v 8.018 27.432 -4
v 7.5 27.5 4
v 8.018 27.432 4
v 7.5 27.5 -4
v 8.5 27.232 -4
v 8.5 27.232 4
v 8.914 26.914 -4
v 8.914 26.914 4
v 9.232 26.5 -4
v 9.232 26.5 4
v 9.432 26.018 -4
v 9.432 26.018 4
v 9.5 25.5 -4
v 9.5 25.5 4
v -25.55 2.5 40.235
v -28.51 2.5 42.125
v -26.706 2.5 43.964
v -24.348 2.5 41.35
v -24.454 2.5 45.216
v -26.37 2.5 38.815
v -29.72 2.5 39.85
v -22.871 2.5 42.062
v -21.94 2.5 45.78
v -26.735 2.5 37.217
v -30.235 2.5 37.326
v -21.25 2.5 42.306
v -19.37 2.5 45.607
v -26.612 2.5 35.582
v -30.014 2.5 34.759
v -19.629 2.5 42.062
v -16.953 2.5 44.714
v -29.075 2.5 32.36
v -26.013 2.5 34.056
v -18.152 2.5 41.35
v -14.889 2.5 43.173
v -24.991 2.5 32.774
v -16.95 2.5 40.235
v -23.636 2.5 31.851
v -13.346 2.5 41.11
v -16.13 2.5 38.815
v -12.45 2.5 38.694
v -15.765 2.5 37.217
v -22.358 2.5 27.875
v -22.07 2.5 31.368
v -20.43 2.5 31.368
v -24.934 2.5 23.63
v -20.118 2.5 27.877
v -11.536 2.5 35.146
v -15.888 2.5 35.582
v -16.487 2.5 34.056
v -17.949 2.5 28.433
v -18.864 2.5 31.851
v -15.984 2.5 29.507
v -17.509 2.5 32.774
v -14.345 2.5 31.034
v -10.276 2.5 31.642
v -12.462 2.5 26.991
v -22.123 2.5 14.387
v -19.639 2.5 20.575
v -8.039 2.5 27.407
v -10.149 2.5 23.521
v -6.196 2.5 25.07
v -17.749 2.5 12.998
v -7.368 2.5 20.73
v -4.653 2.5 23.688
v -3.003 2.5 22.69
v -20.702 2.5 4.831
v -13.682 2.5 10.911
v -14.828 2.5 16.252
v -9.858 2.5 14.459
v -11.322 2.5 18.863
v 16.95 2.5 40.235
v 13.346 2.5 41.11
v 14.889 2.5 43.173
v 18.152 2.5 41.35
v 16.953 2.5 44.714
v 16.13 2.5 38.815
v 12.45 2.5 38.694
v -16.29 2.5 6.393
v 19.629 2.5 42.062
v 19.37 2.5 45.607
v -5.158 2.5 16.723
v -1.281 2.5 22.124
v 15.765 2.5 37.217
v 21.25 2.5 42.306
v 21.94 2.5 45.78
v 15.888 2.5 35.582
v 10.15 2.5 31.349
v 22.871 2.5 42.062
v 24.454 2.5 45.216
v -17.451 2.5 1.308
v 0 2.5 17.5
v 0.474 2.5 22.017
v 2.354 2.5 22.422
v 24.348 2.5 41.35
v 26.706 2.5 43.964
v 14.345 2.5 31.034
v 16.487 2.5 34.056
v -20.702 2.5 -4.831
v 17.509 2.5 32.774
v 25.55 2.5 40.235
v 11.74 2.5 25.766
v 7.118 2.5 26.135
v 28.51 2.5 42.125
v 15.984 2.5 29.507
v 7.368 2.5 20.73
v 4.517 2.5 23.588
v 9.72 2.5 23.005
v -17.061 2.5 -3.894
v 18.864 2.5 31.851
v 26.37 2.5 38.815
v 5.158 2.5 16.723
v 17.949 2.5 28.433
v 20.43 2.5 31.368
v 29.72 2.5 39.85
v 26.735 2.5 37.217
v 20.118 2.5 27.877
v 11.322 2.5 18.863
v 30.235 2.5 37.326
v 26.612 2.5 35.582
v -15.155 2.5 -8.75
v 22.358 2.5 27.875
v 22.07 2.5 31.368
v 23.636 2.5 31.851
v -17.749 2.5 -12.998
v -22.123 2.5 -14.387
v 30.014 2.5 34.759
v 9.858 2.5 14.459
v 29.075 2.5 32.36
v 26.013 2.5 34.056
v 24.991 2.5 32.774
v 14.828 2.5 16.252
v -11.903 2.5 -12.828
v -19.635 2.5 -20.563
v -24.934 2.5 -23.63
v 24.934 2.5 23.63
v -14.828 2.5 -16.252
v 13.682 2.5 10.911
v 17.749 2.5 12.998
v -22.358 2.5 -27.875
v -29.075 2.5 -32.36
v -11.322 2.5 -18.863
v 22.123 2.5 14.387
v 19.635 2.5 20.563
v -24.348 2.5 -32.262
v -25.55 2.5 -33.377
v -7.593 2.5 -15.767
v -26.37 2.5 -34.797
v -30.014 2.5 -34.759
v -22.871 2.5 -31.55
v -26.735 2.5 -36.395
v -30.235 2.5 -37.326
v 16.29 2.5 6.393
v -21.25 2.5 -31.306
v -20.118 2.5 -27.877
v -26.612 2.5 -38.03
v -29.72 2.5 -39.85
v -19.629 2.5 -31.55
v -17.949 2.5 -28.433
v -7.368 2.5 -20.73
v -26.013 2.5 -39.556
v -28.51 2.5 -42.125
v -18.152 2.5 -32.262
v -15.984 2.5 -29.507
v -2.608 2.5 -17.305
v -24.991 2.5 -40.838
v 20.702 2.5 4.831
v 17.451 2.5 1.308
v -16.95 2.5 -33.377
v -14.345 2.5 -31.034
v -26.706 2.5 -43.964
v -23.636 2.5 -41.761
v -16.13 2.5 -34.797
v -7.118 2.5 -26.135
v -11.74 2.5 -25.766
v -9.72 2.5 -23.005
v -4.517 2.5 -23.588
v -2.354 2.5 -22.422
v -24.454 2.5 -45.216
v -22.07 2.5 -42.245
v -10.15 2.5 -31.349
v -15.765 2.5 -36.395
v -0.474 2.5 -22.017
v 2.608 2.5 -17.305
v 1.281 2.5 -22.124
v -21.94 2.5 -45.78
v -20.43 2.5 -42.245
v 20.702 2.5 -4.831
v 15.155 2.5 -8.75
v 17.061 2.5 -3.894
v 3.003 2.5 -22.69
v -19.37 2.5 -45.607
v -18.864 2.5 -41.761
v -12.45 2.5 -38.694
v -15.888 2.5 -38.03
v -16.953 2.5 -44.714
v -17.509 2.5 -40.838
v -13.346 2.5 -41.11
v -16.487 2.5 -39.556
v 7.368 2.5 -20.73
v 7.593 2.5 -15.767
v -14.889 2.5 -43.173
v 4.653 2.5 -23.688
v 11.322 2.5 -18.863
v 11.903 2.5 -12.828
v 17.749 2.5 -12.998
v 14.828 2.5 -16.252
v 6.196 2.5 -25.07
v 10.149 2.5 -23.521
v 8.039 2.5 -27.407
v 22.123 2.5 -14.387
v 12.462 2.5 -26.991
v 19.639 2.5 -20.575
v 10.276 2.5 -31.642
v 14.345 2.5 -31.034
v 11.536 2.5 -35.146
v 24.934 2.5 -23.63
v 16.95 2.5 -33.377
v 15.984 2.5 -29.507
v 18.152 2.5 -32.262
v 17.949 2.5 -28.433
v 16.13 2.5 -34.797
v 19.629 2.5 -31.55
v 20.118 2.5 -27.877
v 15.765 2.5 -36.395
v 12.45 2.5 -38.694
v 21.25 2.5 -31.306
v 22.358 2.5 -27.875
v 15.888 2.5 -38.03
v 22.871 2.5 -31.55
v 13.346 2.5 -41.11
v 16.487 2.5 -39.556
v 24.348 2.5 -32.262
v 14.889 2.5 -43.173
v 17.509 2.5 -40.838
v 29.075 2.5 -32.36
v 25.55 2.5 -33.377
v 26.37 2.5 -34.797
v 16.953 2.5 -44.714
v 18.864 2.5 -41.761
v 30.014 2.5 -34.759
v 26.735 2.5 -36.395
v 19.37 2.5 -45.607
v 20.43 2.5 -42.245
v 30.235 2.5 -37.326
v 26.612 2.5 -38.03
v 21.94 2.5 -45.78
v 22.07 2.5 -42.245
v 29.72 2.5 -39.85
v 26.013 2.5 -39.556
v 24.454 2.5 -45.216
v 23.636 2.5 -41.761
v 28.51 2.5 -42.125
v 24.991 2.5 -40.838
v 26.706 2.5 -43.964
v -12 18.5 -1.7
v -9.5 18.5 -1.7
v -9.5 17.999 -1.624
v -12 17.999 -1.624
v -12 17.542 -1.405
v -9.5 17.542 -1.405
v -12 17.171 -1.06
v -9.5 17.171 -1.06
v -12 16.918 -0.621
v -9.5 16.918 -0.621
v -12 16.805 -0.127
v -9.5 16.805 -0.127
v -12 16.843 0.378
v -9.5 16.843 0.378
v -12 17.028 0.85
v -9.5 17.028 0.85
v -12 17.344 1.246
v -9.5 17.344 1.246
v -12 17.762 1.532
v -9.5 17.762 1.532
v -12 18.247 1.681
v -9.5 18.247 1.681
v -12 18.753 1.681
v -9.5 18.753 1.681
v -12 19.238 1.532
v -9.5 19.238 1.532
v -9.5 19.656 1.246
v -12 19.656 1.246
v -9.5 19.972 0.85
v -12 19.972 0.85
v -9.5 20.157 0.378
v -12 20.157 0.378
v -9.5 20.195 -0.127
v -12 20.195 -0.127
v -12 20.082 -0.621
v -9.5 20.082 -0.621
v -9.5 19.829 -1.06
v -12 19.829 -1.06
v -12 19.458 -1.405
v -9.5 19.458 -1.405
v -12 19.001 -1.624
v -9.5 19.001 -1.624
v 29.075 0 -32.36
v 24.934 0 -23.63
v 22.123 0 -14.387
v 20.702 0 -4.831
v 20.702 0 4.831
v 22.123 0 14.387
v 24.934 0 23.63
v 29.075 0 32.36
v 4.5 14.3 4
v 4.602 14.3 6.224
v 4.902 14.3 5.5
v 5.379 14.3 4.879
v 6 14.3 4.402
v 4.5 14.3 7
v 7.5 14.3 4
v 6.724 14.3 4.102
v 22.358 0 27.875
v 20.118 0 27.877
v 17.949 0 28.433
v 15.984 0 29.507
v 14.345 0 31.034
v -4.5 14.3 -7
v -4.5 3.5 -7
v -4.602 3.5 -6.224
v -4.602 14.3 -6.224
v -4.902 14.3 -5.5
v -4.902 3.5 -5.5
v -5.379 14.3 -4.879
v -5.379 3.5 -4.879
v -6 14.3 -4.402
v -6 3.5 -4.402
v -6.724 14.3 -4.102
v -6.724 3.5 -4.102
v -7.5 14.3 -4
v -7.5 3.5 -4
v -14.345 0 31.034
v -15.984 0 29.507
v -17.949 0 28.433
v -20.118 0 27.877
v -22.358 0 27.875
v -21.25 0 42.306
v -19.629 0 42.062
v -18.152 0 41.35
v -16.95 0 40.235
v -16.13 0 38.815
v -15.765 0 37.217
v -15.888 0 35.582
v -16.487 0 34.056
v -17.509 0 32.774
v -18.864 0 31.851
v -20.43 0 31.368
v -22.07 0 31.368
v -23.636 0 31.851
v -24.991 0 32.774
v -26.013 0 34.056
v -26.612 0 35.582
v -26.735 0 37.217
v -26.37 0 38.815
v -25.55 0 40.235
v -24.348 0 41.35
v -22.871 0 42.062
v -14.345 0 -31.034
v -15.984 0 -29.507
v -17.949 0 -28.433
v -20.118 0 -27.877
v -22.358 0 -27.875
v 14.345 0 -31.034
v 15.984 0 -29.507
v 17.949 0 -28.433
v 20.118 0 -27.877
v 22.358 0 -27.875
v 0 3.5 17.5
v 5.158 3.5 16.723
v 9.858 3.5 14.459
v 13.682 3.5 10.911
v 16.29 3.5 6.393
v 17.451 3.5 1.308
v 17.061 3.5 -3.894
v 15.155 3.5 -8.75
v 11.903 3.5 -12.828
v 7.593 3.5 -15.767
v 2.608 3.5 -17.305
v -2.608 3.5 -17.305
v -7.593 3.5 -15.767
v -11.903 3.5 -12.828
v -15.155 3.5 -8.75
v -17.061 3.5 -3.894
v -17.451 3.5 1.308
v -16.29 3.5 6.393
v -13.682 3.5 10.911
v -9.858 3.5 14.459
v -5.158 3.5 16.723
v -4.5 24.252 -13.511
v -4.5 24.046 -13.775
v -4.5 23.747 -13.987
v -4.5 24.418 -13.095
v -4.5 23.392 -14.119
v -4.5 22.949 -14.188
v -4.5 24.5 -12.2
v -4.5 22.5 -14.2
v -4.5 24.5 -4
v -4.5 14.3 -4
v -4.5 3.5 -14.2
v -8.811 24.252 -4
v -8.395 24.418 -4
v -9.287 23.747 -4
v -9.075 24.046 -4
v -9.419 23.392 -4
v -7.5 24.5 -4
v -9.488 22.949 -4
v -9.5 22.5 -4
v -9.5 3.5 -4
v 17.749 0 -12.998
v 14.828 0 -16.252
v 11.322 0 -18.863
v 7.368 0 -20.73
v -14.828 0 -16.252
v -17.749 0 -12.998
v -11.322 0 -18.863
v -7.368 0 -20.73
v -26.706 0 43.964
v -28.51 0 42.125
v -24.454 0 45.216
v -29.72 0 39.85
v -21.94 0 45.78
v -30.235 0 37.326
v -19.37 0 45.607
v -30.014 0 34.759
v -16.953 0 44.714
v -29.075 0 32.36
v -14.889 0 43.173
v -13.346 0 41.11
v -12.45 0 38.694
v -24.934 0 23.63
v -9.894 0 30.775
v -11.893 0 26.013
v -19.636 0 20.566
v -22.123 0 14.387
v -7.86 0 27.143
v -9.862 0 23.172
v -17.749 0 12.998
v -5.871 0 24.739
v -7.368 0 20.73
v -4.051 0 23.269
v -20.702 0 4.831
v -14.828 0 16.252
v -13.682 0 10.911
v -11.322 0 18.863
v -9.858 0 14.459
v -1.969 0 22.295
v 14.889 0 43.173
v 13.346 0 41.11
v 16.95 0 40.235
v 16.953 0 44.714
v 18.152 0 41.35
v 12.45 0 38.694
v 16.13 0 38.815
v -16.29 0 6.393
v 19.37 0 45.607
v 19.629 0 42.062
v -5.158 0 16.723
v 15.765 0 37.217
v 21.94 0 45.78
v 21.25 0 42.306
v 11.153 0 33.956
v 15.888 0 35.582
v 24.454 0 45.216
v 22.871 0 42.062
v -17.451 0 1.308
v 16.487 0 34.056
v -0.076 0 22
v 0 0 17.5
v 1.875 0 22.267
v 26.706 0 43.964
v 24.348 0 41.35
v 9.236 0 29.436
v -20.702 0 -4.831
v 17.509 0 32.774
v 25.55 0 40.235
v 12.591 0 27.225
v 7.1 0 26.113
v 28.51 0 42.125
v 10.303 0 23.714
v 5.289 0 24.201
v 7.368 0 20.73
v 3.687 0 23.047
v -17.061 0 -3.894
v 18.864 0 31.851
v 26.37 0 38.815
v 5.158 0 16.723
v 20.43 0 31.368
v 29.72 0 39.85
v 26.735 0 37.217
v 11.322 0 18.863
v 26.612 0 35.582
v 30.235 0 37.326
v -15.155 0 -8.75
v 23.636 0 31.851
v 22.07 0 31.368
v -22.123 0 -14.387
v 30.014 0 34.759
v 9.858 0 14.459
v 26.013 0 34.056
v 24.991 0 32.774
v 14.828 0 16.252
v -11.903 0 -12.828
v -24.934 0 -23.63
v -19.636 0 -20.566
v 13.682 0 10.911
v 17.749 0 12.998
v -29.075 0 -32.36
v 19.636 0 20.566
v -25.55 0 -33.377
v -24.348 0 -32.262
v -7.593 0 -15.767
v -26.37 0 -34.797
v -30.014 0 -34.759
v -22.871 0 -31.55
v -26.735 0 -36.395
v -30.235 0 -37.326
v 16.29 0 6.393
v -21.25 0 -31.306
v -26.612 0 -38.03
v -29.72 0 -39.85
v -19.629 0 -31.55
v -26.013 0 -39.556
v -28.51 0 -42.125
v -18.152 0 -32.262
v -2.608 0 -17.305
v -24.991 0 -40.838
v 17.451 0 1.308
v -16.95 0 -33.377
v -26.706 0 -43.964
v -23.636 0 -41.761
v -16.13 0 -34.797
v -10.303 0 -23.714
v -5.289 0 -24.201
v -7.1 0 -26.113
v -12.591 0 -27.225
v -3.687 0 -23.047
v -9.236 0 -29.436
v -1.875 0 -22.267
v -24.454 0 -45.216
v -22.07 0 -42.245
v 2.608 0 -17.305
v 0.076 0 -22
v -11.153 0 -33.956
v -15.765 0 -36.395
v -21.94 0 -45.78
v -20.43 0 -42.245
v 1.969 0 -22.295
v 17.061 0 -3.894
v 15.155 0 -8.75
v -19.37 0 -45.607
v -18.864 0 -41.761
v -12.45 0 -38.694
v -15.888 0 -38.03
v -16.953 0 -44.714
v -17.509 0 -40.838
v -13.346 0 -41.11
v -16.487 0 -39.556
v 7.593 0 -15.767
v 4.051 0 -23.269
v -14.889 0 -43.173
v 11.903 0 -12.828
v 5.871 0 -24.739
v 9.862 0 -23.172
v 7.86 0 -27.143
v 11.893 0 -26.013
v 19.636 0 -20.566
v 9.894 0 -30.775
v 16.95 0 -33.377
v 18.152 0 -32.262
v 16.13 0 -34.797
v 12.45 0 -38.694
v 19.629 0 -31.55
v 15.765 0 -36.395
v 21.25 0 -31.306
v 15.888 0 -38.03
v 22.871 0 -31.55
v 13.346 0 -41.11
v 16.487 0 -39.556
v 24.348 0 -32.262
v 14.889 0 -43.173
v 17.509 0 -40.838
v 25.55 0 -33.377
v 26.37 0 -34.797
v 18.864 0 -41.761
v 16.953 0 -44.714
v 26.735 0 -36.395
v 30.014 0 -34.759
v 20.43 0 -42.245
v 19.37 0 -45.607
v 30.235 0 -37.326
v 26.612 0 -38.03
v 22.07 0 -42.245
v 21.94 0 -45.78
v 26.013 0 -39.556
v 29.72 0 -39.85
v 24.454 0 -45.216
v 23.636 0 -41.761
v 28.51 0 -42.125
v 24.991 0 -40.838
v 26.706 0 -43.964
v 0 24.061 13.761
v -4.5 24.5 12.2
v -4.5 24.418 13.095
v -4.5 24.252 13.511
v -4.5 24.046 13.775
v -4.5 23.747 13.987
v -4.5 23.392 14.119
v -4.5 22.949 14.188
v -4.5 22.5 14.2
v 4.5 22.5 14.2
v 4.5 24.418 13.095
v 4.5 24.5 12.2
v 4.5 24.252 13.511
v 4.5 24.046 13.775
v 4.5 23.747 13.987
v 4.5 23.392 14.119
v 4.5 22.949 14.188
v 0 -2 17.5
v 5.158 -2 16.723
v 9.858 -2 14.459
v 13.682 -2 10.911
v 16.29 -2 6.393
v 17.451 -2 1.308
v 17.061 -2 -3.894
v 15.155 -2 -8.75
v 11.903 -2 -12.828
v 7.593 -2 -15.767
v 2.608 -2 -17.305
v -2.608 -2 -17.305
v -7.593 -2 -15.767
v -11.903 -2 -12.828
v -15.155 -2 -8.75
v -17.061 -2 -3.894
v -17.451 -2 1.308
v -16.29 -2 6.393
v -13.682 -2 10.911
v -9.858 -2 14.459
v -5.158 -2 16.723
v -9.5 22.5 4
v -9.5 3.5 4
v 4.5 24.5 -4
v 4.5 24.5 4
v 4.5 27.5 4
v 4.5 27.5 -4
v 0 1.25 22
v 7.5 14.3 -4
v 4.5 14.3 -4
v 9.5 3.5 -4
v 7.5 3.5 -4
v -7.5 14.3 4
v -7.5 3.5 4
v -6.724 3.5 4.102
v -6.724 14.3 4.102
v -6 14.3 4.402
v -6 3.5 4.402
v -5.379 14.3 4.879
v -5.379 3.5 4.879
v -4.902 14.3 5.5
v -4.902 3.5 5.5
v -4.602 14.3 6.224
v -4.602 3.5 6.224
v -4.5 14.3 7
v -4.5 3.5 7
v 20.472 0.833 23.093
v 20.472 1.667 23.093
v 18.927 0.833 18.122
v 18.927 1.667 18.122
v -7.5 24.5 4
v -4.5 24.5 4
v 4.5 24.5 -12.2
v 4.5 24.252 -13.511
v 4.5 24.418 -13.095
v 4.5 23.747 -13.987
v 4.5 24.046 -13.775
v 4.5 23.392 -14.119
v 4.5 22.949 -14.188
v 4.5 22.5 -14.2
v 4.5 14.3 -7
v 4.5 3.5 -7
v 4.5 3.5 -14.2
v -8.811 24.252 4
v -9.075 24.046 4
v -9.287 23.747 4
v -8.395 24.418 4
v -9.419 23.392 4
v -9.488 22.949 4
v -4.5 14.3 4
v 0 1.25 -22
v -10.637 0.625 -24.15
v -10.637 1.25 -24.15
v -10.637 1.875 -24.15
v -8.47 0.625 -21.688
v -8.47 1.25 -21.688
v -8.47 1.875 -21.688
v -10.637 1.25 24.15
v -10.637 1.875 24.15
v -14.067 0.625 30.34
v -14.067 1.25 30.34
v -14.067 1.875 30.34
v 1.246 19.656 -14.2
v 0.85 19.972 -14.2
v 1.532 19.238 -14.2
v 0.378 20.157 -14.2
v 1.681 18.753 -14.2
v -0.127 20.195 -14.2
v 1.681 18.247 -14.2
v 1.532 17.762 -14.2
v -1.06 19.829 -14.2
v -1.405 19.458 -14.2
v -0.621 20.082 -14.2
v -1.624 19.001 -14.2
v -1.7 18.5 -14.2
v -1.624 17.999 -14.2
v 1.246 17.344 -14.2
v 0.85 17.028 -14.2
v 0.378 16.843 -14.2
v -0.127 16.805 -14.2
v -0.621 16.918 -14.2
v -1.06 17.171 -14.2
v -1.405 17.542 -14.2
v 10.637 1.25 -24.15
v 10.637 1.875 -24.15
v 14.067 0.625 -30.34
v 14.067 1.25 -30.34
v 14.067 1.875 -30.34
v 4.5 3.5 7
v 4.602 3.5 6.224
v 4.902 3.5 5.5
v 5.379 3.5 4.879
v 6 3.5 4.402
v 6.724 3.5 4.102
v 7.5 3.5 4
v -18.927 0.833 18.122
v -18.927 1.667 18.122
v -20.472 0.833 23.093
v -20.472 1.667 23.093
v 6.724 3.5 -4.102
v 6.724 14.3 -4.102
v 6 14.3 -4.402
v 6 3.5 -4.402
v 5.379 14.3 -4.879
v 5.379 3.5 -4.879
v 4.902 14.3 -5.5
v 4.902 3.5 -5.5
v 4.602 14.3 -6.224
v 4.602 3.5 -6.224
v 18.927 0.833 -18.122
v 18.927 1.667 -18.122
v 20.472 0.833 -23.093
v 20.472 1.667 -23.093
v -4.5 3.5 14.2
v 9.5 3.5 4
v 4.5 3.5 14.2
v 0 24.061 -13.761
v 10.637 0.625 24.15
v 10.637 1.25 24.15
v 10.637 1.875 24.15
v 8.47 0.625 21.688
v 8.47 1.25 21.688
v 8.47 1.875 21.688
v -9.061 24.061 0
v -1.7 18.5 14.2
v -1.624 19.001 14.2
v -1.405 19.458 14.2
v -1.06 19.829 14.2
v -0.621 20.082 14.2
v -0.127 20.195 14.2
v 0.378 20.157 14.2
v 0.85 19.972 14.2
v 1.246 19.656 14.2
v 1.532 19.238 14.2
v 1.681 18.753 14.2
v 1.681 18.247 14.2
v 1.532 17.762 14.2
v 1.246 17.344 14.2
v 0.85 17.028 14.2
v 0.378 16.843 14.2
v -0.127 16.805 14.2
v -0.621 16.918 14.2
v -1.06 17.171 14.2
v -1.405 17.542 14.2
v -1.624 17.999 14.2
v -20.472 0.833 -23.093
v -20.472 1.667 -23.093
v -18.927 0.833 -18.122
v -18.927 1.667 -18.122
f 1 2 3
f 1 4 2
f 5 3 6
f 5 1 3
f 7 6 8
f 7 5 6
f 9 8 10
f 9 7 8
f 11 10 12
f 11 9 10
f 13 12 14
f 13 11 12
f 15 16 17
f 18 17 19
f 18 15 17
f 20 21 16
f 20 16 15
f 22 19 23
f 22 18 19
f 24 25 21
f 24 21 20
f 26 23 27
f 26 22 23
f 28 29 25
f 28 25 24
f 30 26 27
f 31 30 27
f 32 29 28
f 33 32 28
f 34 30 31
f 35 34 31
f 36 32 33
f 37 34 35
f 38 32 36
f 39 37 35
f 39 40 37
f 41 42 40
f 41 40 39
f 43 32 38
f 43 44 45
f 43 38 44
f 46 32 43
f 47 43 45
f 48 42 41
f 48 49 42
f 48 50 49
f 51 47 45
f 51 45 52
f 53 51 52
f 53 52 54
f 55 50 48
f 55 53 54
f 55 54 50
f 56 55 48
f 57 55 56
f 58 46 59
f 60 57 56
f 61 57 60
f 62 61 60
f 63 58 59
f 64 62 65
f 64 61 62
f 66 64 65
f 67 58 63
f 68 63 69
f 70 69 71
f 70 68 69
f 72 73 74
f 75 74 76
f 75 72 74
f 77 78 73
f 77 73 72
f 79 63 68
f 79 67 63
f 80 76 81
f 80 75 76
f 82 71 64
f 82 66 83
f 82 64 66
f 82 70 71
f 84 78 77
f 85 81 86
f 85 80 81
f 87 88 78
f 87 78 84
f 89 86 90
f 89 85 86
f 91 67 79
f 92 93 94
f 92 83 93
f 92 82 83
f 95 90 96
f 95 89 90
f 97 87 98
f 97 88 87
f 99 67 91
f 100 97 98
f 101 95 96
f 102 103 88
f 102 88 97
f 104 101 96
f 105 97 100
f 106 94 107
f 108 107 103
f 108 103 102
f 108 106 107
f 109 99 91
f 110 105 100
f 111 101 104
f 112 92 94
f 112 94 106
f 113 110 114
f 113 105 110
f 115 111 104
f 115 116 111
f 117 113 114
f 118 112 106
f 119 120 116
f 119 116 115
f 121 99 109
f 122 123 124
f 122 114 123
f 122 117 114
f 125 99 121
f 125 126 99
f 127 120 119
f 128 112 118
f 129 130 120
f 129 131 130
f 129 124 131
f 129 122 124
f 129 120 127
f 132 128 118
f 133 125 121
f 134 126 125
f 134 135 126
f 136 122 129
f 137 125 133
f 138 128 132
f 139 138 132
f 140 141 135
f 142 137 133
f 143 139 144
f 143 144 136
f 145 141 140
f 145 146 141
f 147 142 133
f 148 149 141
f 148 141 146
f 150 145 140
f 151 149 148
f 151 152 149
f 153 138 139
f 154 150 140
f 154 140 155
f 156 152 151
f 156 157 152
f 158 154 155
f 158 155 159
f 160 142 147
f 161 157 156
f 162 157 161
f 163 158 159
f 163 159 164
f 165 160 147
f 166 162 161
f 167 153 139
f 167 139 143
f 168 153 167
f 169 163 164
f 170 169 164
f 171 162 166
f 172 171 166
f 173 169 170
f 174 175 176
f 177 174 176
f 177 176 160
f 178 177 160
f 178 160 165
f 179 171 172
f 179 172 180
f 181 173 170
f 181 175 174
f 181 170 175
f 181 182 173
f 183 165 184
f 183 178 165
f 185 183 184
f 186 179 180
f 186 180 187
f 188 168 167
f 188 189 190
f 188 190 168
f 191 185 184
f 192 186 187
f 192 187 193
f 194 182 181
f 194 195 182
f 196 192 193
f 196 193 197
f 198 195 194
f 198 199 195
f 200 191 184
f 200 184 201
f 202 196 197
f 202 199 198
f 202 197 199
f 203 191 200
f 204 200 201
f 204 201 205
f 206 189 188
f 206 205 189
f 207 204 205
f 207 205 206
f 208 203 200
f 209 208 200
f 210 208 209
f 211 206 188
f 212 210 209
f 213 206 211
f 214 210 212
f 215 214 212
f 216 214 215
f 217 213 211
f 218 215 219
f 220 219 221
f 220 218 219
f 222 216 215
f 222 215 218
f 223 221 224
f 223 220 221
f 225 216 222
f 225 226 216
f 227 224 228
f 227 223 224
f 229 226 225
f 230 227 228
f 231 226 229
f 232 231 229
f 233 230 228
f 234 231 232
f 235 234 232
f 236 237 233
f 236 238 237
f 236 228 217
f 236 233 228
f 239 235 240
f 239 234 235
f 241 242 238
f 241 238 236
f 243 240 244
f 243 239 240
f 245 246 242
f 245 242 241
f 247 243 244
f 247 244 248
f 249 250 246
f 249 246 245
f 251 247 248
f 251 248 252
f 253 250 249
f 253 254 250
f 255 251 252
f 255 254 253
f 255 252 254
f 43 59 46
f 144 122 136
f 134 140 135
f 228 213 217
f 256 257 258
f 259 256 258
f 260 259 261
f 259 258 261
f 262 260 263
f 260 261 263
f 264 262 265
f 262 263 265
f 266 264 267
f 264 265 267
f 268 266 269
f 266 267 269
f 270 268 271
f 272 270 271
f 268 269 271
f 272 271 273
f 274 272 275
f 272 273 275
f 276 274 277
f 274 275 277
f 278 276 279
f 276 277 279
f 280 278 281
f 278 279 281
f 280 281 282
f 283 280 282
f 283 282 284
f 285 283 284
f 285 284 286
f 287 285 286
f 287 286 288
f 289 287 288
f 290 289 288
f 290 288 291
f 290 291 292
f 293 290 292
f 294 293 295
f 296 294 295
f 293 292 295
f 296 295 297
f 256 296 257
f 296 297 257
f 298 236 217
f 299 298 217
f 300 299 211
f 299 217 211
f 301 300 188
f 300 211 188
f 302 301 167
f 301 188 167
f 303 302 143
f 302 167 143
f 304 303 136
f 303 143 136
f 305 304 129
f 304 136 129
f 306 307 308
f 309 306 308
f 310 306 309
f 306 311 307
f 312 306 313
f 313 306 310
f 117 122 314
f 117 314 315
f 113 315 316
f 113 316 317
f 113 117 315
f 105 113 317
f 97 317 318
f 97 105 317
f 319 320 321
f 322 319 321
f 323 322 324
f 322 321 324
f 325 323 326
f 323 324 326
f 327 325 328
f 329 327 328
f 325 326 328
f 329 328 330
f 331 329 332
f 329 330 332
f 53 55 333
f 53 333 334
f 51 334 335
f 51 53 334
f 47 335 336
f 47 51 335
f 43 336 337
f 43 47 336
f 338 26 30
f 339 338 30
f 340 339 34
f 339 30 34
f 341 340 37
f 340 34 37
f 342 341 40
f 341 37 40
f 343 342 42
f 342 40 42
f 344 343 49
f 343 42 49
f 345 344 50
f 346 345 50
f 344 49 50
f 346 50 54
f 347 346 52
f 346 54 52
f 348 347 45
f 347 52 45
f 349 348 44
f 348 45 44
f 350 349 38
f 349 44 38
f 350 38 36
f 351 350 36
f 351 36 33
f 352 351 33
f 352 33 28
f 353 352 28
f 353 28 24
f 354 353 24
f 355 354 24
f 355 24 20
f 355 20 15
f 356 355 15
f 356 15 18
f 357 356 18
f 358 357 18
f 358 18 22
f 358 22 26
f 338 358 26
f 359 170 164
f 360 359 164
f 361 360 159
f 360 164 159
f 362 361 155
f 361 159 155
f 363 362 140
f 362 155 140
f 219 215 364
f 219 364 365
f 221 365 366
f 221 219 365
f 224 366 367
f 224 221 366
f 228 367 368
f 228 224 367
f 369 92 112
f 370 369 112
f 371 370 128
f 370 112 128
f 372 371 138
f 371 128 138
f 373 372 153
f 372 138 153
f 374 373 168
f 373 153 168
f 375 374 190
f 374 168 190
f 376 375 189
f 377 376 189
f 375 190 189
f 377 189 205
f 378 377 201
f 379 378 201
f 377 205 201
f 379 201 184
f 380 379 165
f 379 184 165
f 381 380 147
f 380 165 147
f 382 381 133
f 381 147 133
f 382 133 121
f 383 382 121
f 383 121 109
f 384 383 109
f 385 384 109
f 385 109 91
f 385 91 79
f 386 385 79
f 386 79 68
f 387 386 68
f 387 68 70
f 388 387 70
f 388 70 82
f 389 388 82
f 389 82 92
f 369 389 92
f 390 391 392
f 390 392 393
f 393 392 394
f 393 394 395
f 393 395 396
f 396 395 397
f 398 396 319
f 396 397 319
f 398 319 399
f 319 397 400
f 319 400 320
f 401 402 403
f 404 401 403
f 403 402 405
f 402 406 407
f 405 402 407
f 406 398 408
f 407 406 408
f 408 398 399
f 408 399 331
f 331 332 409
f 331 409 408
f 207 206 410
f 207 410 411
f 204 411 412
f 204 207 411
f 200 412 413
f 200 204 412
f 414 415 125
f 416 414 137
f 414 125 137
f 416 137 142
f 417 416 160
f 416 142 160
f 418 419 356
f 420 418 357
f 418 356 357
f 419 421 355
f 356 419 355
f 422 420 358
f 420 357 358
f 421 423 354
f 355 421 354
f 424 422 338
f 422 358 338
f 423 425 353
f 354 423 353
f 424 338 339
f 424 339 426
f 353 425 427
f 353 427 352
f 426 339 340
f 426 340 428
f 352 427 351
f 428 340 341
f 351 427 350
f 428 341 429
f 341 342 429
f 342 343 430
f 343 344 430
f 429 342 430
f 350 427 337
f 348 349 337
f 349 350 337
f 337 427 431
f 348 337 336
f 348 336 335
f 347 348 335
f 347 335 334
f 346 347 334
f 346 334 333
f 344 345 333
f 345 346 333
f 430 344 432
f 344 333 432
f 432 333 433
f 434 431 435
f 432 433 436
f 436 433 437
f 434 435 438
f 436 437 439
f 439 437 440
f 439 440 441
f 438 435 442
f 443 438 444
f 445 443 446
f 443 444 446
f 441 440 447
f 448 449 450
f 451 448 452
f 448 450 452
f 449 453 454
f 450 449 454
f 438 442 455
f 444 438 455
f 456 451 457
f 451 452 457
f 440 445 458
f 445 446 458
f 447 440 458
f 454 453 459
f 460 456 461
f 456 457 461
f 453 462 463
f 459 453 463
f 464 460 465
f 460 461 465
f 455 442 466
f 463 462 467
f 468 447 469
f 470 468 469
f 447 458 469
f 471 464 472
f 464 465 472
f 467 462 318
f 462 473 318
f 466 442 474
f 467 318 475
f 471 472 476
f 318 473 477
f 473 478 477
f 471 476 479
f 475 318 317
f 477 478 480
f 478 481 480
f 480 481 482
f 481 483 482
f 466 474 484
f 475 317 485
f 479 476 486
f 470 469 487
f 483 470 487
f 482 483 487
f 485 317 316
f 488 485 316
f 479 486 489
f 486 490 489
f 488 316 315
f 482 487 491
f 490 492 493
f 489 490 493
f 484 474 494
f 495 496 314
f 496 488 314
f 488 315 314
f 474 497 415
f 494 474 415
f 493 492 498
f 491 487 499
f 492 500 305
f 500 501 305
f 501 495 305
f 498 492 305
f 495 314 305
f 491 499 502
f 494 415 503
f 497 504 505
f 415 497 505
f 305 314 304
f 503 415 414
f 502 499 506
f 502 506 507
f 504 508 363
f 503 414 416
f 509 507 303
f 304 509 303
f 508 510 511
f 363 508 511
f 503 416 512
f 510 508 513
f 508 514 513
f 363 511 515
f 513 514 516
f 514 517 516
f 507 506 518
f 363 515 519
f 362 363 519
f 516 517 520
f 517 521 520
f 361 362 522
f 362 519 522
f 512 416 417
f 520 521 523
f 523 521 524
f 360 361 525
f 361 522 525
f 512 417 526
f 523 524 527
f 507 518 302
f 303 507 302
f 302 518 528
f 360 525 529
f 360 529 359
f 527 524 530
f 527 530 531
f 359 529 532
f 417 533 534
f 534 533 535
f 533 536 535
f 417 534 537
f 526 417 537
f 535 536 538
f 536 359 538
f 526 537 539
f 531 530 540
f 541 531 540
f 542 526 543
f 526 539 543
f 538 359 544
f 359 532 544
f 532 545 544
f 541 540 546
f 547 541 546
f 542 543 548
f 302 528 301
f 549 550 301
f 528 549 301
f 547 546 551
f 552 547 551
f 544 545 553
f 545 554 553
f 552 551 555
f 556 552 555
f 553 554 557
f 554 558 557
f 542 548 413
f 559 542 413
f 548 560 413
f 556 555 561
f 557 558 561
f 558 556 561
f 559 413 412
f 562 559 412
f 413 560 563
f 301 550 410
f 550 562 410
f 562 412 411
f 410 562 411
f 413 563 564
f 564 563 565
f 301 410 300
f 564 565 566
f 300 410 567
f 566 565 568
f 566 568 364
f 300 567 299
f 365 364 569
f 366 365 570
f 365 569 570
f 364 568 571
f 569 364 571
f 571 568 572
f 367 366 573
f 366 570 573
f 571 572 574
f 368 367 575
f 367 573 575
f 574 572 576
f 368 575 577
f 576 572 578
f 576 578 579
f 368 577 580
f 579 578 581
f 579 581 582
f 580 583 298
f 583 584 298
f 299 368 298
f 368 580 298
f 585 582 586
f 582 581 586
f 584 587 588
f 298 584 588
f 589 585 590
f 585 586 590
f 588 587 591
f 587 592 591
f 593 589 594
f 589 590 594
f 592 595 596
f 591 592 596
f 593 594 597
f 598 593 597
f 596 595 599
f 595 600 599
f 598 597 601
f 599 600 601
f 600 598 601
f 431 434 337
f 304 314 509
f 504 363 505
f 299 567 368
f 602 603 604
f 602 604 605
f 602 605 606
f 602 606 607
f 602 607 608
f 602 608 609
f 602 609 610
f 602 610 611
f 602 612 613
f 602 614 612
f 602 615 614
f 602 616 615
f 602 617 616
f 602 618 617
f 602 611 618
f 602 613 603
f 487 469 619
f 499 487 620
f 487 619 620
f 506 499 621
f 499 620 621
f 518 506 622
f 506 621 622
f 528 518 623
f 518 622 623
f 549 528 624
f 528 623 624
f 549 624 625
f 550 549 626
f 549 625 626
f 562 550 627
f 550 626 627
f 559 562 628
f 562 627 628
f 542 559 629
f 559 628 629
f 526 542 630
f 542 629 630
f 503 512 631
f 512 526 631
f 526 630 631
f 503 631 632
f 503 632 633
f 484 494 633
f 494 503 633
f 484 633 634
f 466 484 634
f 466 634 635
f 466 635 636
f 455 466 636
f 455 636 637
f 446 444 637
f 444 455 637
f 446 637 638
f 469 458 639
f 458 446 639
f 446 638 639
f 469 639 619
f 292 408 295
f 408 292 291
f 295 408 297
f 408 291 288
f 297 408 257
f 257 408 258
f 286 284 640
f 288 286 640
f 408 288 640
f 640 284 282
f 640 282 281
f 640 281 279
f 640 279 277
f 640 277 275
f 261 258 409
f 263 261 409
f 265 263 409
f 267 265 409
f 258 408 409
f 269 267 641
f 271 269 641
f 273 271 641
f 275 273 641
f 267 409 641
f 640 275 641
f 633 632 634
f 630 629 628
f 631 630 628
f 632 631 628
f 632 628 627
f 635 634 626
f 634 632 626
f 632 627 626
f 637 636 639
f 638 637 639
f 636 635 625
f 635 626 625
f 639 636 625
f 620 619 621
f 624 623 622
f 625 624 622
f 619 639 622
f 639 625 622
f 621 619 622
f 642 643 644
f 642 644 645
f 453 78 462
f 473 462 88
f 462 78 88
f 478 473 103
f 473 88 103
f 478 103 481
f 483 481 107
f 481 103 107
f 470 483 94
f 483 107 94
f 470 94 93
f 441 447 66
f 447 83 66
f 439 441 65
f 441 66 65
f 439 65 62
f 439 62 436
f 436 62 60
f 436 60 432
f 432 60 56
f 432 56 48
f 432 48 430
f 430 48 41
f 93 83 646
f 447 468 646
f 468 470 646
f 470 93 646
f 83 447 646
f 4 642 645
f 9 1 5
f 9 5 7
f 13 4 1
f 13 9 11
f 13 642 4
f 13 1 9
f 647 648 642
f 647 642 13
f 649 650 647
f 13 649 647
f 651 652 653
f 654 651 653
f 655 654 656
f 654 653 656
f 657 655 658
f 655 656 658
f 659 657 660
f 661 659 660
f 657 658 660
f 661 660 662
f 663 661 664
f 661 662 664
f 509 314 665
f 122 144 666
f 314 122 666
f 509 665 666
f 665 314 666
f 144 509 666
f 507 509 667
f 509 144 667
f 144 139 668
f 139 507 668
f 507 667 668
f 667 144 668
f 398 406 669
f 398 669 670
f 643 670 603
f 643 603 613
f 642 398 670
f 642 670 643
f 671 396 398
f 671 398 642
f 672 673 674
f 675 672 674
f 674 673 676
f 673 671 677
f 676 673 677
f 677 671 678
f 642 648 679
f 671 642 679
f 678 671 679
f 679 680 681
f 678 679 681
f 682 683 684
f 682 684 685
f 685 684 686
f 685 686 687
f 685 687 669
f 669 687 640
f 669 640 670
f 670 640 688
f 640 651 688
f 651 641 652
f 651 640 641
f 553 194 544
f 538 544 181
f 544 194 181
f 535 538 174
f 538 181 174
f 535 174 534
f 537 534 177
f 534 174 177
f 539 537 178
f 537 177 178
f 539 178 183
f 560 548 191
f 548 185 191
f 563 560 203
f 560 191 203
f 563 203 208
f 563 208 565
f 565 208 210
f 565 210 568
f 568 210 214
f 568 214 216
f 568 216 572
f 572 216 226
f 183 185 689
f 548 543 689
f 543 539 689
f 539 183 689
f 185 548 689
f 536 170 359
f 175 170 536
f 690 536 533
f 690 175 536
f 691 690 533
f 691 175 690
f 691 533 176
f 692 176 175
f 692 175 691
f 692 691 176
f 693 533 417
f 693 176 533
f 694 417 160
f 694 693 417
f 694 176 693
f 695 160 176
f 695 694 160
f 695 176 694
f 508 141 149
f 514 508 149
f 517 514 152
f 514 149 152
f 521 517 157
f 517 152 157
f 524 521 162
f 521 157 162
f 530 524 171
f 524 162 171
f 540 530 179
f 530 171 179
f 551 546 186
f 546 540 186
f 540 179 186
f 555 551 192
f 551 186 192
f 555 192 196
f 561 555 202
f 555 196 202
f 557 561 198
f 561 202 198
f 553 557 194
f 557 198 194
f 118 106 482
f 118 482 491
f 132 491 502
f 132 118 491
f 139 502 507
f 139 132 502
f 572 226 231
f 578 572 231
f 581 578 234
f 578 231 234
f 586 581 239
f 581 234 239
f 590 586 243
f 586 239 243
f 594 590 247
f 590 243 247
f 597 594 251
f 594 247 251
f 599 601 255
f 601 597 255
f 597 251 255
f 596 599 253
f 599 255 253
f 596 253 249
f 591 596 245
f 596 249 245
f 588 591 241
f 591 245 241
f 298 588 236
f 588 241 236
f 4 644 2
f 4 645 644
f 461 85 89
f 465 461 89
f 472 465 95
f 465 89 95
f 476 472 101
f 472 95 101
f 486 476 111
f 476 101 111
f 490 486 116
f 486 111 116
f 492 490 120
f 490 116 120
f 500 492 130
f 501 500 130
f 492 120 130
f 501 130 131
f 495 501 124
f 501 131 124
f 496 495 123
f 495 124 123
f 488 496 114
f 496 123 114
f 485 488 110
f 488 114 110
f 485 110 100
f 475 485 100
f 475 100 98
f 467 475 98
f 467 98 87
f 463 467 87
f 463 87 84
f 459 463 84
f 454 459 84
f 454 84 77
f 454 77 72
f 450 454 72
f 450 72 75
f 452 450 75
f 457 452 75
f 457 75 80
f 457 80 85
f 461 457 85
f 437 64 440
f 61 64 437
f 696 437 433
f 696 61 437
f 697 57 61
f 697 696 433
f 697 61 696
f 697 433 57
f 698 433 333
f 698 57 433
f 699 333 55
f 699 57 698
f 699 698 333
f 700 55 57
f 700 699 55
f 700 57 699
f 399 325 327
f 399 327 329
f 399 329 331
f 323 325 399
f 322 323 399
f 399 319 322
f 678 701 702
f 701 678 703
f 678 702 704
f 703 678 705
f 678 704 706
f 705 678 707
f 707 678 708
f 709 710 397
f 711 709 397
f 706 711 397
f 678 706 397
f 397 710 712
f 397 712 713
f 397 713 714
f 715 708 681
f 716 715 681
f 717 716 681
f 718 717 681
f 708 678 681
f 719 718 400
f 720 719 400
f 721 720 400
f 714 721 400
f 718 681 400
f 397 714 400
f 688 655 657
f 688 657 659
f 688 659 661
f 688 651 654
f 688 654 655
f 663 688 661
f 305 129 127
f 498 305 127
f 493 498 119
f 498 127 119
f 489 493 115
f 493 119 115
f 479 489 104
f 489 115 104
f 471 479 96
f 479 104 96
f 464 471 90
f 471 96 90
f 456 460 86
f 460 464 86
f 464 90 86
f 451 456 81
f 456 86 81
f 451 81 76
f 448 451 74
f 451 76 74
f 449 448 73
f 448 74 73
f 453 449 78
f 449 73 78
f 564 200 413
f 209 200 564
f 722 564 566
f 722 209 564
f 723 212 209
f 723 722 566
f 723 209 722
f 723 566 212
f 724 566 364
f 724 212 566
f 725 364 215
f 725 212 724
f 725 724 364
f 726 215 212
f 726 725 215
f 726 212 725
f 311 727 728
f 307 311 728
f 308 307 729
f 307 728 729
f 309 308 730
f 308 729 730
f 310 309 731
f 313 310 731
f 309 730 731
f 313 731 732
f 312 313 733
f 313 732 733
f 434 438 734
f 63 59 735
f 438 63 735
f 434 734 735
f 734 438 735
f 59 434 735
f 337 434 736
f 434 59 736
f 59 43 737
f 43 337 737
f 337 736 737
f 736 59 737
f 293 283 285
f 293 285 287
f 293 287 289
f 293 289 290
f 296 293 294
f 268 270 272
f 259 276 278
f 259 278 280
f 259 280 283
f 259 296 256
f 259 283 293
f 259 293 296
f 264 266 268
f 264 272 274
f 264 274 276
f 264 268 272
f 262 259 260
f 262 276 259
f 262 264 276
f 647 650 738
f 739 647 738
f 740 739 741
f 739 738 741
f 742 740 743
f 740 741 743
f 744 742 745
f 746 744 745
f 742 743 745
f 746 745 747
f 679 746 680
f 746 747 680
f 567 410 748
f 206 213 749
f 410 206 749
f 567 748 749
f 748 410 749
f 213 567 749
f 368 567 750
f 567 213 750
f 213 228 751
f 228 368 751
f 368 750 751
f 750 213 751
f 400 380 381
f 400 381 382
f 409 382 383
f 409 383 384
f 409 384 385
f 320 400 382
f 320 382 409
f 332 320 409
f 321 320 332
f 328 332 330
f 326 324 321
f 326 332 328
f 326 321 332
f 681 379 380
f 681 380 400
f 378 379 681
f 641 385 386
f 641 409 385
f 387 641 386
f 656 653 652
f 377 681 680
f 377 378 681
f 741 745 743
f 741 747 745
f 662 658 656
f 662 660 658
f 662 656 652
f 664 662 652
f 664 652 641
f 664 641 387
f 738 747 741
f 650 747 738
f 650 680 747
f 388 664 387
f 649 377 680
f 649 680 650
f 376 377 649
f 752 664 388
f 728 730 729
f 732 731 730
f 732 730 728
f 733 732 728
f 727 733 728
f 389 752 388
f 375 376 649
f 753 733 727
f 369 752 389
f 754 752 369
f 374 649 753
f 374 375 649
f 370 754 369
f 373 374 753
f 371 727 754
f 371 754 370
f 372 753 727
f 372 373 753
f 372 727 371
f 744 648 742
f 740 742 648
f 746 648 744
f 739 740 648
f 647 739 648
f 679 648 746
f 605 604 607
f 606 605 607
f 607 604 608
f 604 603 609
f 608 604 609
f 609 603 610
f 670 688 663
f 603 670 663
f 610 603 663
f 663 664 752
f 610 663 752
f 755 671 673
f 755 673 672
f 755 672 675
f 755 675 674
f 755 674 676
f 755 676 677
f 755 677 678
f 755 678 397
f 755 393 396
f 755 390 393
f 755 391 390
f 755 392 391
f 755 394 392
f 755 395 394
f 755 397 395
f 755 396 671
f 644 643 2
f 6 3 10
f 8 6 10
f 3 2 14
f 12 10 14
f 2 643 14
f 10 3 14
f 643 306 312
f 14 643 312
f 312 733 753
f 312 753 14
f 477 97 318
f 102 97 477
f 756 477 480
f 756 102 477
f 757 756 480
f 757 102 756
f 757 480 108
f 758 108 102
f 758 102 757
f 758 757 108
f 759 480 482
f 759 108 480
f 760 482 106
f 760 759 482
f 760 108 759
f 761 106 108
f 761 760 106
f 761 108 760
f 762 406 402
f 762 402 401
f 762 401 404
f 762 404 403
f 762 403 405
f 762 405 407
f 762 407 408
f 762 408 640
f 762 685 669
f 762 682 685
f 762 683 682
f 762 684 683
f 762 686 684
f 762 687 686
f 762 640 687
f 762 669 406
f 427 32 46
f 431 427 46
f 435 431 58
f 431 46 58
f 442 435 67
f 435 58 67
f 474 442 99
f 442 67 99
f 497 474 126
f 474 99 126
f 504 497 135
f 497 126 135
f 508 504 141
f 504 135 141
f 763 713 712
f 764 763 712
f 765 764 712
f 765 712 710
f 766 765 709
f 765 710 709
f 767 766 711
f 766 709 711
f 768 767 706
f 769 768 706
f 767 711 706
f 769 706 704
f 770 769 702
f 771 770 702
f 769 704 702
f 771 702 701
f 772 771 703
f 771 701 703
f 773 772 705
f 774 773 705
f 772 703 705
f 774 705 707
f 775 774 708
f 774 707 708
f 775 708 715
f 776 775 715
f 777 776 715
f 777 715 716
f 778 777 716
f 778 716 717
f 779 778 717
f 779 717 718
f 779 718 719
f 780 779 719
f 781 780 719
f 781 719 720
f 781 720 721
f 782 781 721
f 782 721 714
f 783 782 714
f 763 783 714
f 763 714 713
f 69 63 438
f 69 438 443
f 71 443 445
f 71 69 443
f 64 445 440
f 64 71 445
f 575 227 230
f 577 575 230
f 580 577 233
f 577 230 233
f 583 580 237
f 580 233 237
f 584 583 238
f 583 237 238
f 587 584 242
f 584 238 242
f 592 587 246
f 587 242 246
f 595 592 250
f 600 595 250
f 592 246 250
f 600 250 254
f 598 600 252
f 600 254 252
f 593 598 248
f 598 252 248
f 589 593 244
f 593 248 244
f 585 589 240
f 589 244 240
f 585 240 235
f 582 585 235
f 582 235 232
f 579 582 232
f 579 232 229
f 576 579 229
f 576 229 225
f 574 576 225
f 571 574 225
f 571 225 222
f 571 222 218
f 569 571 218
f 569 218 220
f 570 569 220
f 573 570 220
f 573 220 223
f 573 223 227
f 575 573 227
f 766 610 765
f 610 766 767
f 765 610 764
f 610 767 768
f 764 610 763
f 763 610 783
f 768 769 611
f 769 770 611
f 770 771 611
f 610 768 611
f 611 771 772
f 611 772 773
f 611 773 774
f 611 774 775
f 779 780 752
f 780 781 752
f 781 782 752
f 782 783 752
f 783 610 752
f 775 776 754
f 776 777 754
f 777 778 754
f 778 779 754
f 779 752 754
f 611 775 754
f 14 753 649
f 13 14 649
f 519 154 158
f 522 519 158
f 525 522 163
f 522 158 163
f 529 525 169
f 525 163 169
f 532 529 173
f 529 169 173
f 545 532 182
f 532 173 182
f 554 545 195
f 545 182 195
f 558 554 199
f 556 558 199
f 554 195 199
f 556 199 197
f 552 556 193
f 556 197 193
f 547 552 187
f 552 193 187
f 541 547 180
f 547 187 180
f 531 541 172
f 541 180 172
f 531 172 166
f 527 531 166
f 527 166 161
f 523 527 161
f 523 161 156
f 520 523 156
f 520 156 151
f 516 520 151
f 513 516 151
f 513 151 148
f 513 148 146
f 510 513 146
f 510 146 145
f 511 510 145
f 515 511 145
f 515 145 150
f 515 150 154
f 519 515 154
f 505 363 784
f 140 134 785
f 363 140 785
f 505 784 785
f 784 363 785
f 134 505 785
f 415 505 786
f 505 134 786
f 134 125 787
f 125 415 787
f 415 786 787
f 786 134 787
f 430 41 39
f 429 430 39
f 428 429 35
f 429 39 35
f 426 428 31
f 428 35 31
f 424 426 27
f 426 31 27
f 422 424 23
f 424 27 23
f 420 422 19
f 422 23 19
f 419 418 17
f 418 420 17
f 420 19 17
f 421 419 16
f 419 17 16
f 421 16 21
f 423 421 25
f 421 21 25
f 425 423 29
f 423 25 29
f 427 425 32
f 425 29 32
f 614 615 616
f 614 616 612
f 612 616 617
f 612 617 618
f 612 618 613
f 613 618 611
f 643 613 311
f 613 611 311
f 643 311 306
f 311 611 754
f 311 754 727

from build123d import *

# Parameters (mm, degrees)
SKETCH1_W                = 100
SKETCH1_H                = 100
BOSS_EXTRUDE1_DEPTH      = 2.5
SKETCH2_W                = 100
SKETCH2_H                = 100
SKETCH2_R                = 5.5
CUT_EXTRUDE1_DEPTH       = 10
CUT_EXTRUDE3_DEPTH       = 10
BOSS_EXTRUDE2_DEPTH      = 1
BOSS_EXTRUDE2_DEPTH_BACK = 4.5
SKETCH6_R                = 17.5
BOSS_EXTRUDE6_DEPTH      = 21
FILLET1_SIZE             = 2
FILLET2_SIZE             = 2
SKETCH12_R               = 1.7
CUT_EXTRUDE4_DEPTH       = 72.5265134
SKETCH13_R               = 1.7
BOSS_EXTRUDE8_DEPTH      = 2.5
SKETCH16_W               = 5
SKETCH16_H               = 8
BOSS_EXTRUDE9_DEPTH      = 24
FILLET3_R                = 2
BOSS_EXTRUDE10_DEPTH     = 10.8


with BuildPart() as part:
    # Sketch1 → Boss-Extrude1 (new body)
    with BuildSketch(Plane(origin=(0, 0, 0), x_dir=(1, 0, 0), z_dir=(0, 1, 0))):
        Rectangle(SKETCH1_W, SKETCH1_H)
    extrude(amount=BOSS_EXTRUDE1_DEPTH)

    # Sketch2 → Cut-Extrude1 (cut)
    # profile 1 of 5: a face of its own
    with BuildSketch(Plane(origin=(0, 2.5, 0), x_dir=(1, 0, 0), z_dir=(0, 1, 0))):
        Rectangle(SKETCH2_W, SKETCH2_H)
        with BuildLine():
            ThreePointArc((-29.074945731, -32.359707621), (-20.523161881, 0), (-29.074945731, 32.359707621))
            ThreePointArc((-29.074945731, 32.359707621), (-24.454355603, 45.216317777), (-12.450207096, 38.693841525))
            add(Edge.make_bspline(
                [(-12.450207096, 38.693841525), (0, -19.342739332), (12.450207096, 38.693841525)],
                knots=[5.128046308, 5.128046308, 5.128046308, 7.438324307, 7.438324307, 7.438324307], degree=2, weights=[1, 0.403791374, 1]))
            ThreePointArc((12.450207096, 38.693841525), (24.454355603, 45.216317777), (29.074945731, 32.359707621))
            ThreePointArc((29.074945731, 32.359707621), (20.523161881, 0), (29.074945731, -32.359707621))
            ThreePointArc((29.074945731, -32.359707621), (24.454355603, -45.216317777), (12.450207096, -38.693841525))
            add(Edge.make_bspline(
                [(12.450207096, -38.693841525), (0, 19.342739332), (-12.450207096, -38.693841525)],
                knots=[5.128046308, 5.128046308, 5.128046308, 7.438324307, 7.438324307, 7.438324307], degree=2, weights=[1, 0.403791374, 1]))
            ThreePointArc((-12.450207096, -38.693841525), (-24.454355603, -45.216317777), (-29.074945731, -32.359707621))
        make_face(mode=Mode.SUBTRACT)
    # profile 2 of 5: a face of its own
    with BuildSketch(Plane(origin=(0, 2.5, 0), x_dir=(1, 0, 0), z_dir=(0, 1, 0))):
        with Locations(Location((-21.25, 36.806079661, 0), (0, 0, 270))):
            Circle(SKETCH2_R)
    # profile 3 of 5: a face of its own
    with BuildSketch(Plane(origin=(0, 2.5, 0), x_dir=(1, 0, 0), z_dir=(0, 1, 0))):
        with Locations(Location((-21.25, -36.806079661, 0), (0, 0, 270))):
            Circle(SKETCH2_R)
    # profile 4 of 5: a face of its own
    with BuildSketch(Plane(origin=(0, 2.5, 0), x_dir=(1, 0, 0), z_dir=(0, 1, 0))):
        with Locations(Location((21.25, -36.806079661, 0), (0, 0, 270))):
            Circle(SKETCH2_R)
    # profile 5 of 5: a face of its own
    with BuildSketch(Plane(origin=(0, 2.5, 0), x_dir=(1, 0, 0), z_dir=(0, 1, 0))):
        with Locations(Location((21.25, 36.806079661, 0), (0, 0, 270))):
            Circle(SKETCH2_R)
    extrude(amount=-CUT_EXTRUDE1_DEPTH, mode=Mode.SUBTRACT)

    # Sketch4 → Cut-Extrude3 (cut)
    with BuildSketch(Plane(origin=(0, 2.5, 0), x_dir=(1, 0, 0), z_dir=(0, 1, 0))):
        with BuildLine():
            ThreePointArc((-17.749489284, -12.998293356), (-13.140045691, -17.64480658), (-7.367625104, -20.729643034))
            add(Edge.make_bspline(
                [(-7.367625104, -20.729643034), (-7.747241798, -21.030061446), (-8.114529726, -21.350348356), (-9.247106431, -22.428016295), (-9.96747496, -23.25295704), (-11.975526868, -25.945450431), (-13.113170007, -28.031524091), (-14.161311212, -30.568863064), (-14.254109179, -30.800153833), (-14.345065296, -31.033569225)],
                knots=[0.658936879, 0.658936879, 0.658936879, 0.658936879, 0.6875, 0.6875, 0.75, 0.75, 0.875, 0.875, 0.887405876, 0.887405876, 0.887405876, 0.887405876], degree=3))
            ThreePointArc((-14.345065296, -31.033569225), (-17.949067849, -28.433275654), (-22.357942029, -27.874536431))
            add(Edge.make_bspline(
                [(-17.749489284, -12.998293356), (-18.730013182, -18.148505445), (-20.279042278, -23.126345909), (-22.357942029, -27.874536431)],
                knots=[0.6784999, 0.6784999, 0.6784999, 0.6784999, 0.896036051, 0.896036051, 0.896036051, 0.896036051], degree=3, weights=[0.94303917, 0.94979881, 0.960677405, 0.975674954]))
        make_face()
        with BuildLine():
            ThreePointArc((7.367625104, -20.729643034), (13.140045691, -17.64480658), (17.749489284, -12.998293356))
            add(Edge.make_bspline(
                [(22.357942029, -27.874536431), (20.279042278, -23.126345909), (18.730013182, -18.148505445), (17.749489284, -12.998293356)],
                knots=[0.103963949, 0.103963949, 0.103963949, 0.103963949, 0.3215001, 0.3215001, 0.3215001, 0.3215001], degree=3, weights=[0.975674954, 0.960677405, 0.94979881, 0.94303917]))
            ThreePointArc((22.357942029, -27.874536431), (17.949067849, -28.433275654), (14.345065296, -31.033569225))
            add(Edge.make_bspline(
                [(14.345065296, -31.033569225), (14.254109179, -30.800153832), (14.161311212, -30.568863064), (13.113170007, -28.031524091), (11.975526868, -25.945450431), (9.96747496, -23.25295704), (9.247106431, -22.428016295), (8.114529726, -21.350348356), (7.747241798, -21.030061447), (7.367625104, -20.729643034)],
                knots=[0.112594124, 0.112594124, 0.112594124, 0.112594124, 0.125, 0.125, 0.25, 0.25, 0.3125, 0.3125, 0.341063121, 0.341063121, 0.341063121, 0.341063121], degree=3))
        make_face()
        with BuildLine():
            ThreePointArc((14.345065296, 31.033569225), (17.949067849, 28.433275654), (22.357942029, 27.874536431))
            add(Edge.make_bspline(
                [(17.749489284, 12.998293356), (18.730013182, 18.148505445), (20.279042278, 23.126345909), (22.357942029, 27.874536431)],
                knots=[0.6784999, 0.6784999, 0.6784999, 0.6784999, 0.896036051, 0.896036051, 0.896036051, 0.896036051], degree=3, weights=[0.94303917, 0.94979881, 0.960677405, 0.975674954]))
            ThreePointArc((17.749489284, 12.998293356), (13.140045691, 17.64480658), (7.367625104, 20.729643034))
            add(Edge.make_bspline(
                [(7.367625104, 20.729643034), (7.747241798, 21.030061446), (8.114529726, 21.350348356), (9.247106431, 22.428016295), (9.96747496, 23.25295704), (11.975526868, 25.945450431), (13.113170007, 28.031524091), (14.161311212, 30.568863064), (14.254109179, 30.800153833), (14.345065296, 31.033569225)],
                knots=[0.658936879, 0.658936879, 0.658936879, 0.658936879, 0.6875, 0.6875, 0.75, 0.75, 0.875, 0.875, 0.887405876, 0.887405876, 0.887405876, 0.887405876], degree=3))
        make_face()
        with BuildLine():
            ThreePointArc((-14.345065296, 31.033569225), (-17.949067849, 28.433275654), (-22.357942029, 27.874536431))
            add(Edge.make_bspline(
                [(-22.357942029, 27.874536431), (-20.279042278, 23.126345909), (-18.730013182, 18.148505445), (-17.749489284, 12.998293356)],
                knots=[0.103963949, 0.103963949, 0.103963949, 0.103963949, 0.3215001, 0.3215001, 0.3215001, 0.3215001], degree=3, weights=[0.975674954, 0.960677405, 0.94979881, 0.94303917]))
            ThreePointArc((-17.749489284, 12.998293356), (-13.140045691, 17.64480658), (-7.367625104, 20.729643034))
            add(Edge.make_bspline(
                [(-14.345065296, 31.033569225), (-14.254109179, 30.800153832), (-14.161311212, 30.568863064), (-13.113170007, 28.031524091), (-11.975526868, 25.945450431), (-9.96747496, 23.25295704), (-9.247106431, 22.428016295), (-8.114529726, 21.350348356), (-7.747241798, 21.030061447), (-7.367625104, 20.729643034)],
                knots=[0.112594124, 0.112594124, 0.112594124, 0.112594124, 0.125, 0.125, 0.25, 0.25, 0.3125, 0.3125, 0.341063121, 0.341063121, 0.341063121, 0.341063121], degree=3))
        make_face()
    extrude(amount=-CUT_EXTRUDE3_DEPTH, mode=Mode.SUBTRACT)

    # Sketch6 → Boss-Extrude2 (add, two sides: drawn at the far end of the back side and taken through both)
    with BuildSketch(Plane(origin=(0, 2.5, 0), x_dir=(1, 0, 0), z_dir=(0, 1, 0)).offset(-BOSS_EXTRUDE2_DEPTH_BACK)):
        with Locations(Location((0, 0, 0), (0, 0, 270))):
            Circle(SKETCH6_R)
    extrude(amount=BOSS_EXTRUDE2_DEPTH + BOSS_EXTRUDE2_DEPTH_BACK)

    # Sketch9 → Boss-Extrude6 (add)
    with BuildSketch(Plane(origin=(0, 3.5, 0), x_dir=(1, 0, 0), z_dir=(0, 1, 0))):
        Polygon((-4.5, 4), (-9.5, 4), (-9.5, -4), (-4.5, -4), (-4.5, -14.2), (4.5, -14.2), (4.5, 14.2), (-4.5, 14.2), align=None)
    extrude(amount=BOSS_EXTRUDE6_DEPTH)

    # Fillet1
    # a fillet whose section is not a circle: 2 mm, written as the material it takes off along each edge
    with BuildSketch(Plane(origin=(-9.5, 24.5, -9), x_dir=(0, -1, 0), z_dir=(0, 0, 1))) as fillet1_piece_1:
        with BuildLine():
            add(Edge.make_bspline([(FILLET1_SIZE, 0), (FILLET1_SIZE * 0.831801948466, 0), (FILLET1_SIZE * 0.663603896932, 0), (FILLET1_SIZE * 0.292893218813, FILLET1_SIZE * 0.0716919198361), (FILLET1_SIZE * 0.0716919198361, FILLET1_SIZE * 0.292893218813), (0, FILLET1_SIZE * 0.663603896932), (0, FILLET1_SIZE * 0.831801948466), (0, FILLET1_SIZE)], knots=[0, 0, 0, 0, 0, 0, 0.5, 0.5, 1, 1, 1, 1, 1, 1], degree=5))
            Line((0, FILLET1_SIZE), (0, 0))
            Line((0, 0), (FILLET1_SIZE, 0))
        make_face()
    extrude(amount=18, mode=Mode.SUBTRACT)

    # Fillet2
    # a fillet whose section is not a circle: 2 mm, written as the material it takes off along each edge
    with BuildSketch(Plane(origin=(-9.5, 24.5, 14.2), x_dir=(0, -1, 0), z_dir=(1, 0, 0)), Plane(origin=(9.5, 24.5, -14.2), x_dir=(0, -1, 0), z_dir=(-1, 0, 0))) as fillet2_piece_1:
        with BuildLine():
            add(Edge.make_bspline([(FILLET2_SIZE, 0), (FILLET2_SIZE * 0.831801948466, 0), (FILLET2_SIZE * 0.663603896932, 0), (FILLET2_SIZE * 0.292893218813, FILLET2_SIZE * 0.0716919198361), (FILLET2_SIZE * 0.0716919198361, FILLET2_SIZE * 0.292893218813), (0, FILLET2_SIZE * 0.663603896932), (0, FILLET2_SIZE * 0.831801948466), (0, FILLET2_SIZE)], knots=[0, 0, 0, 0, 0, 0, 0.5, 0.5, 1, 1, 1, 1, 1, 1], degree=5))
            Line((0, FILLET2_SIZE), (0, 0))
            Line((0, 0), (FILLET2_SIZE, 0))
        make_face()
    extrude(amount=19, mode=Mode.SUBTRACT)

    # Sketch12 → Cut-Extrude4 (cut, through all)
    with BuildSketch(Plane(origin=(0, 0, -14.2), x_dir=(-1, 0, 0), z_dir=(0, 0, -1))):
        with Locations((0, 18.5)):
            Circle(SKETCH12_R)
    extrude(amount=-CUT_EXTRUDE4_DEPTH, mode=Mode.SUBTRACT)

    # Sketch13 → Boss-Extrude8 (add)
    with BuildSketch(Plane.ZY.offset(9.5)):
        with Locations(Location((0, 18.5, 0), (0, 0, 180))):
            Circle(SKETCH13_R)
    extrude(amount=BOSS_EXTRUDE8_DEPTH)

    # Sketch16 → Boss-Extrude9 (add)
    with BuildSketch(Plane(origin=(0, 3.5, 0), x_dir=(1, 0, 0), z_dir=(0, 1, 0))):
        with Locations((7, 0)):
            Rectangle(SKETCH16_W, SKETCH16_H)
    extrude(amount=BOSS_EXTRUDE9_DEPTH)

    # Fillet3
    fillet3_edges = [part.edges().sort_by_distance(p)[0] for p in [
        (9.5, 27.5, 0),
    ]]
    fillet(fillet3_edges, radius=FILLET3_R)

    # Sketch18 → Boss-Extrude10 (add)
    with BuildSketch(Plane(origin=(0, 3.5, 0), x_dir=(1, 0, 0), z_dir=(0, 1, 0))):
        with BuildLine():
            Line((-9.5, -4), (-7.5, -4))
            ThreePointArc((-7.5, -4), (-5.378679656, -4.878679656), (-4.5, -7))
            Line((-4.5, -7), (-4.5, -14.2))
            Line((-4.5, -14.2), (4.5, -14.2))
            Line((4.5, -14.2), (4.5, -7))
            ThreePointArc((4.5, -7), (5.378679656, -4.878679656), (7.5, -4))
            Line((7.5, -4), (9.5, -4))
            Line((9.5, -4), (9.5, 4))
            Line((9.5, 4), (7.5, 4))
            ThreePointArc((7.5, 4), (5.378679656, 4.878679656), (4.5, 7))
            Line((4.5, 7), (4.5, 14.2))
            Line((4.5, 14.2), (-4.5, 14.2))
            Line((-4.5, 14.2), (-4.5, 7))
            ThreePointArc((-4.5, 7), (-5.378679656, 4.878679656), (-7.5, 4))
            Line((-7.5, 4), (-9.5, 4))
            Line((-9.5, 4), (-9.5, -4))
        make_face()
    extrude(amount=BOSS_EXTRUDE10_DEPTH)


solid = part.part
